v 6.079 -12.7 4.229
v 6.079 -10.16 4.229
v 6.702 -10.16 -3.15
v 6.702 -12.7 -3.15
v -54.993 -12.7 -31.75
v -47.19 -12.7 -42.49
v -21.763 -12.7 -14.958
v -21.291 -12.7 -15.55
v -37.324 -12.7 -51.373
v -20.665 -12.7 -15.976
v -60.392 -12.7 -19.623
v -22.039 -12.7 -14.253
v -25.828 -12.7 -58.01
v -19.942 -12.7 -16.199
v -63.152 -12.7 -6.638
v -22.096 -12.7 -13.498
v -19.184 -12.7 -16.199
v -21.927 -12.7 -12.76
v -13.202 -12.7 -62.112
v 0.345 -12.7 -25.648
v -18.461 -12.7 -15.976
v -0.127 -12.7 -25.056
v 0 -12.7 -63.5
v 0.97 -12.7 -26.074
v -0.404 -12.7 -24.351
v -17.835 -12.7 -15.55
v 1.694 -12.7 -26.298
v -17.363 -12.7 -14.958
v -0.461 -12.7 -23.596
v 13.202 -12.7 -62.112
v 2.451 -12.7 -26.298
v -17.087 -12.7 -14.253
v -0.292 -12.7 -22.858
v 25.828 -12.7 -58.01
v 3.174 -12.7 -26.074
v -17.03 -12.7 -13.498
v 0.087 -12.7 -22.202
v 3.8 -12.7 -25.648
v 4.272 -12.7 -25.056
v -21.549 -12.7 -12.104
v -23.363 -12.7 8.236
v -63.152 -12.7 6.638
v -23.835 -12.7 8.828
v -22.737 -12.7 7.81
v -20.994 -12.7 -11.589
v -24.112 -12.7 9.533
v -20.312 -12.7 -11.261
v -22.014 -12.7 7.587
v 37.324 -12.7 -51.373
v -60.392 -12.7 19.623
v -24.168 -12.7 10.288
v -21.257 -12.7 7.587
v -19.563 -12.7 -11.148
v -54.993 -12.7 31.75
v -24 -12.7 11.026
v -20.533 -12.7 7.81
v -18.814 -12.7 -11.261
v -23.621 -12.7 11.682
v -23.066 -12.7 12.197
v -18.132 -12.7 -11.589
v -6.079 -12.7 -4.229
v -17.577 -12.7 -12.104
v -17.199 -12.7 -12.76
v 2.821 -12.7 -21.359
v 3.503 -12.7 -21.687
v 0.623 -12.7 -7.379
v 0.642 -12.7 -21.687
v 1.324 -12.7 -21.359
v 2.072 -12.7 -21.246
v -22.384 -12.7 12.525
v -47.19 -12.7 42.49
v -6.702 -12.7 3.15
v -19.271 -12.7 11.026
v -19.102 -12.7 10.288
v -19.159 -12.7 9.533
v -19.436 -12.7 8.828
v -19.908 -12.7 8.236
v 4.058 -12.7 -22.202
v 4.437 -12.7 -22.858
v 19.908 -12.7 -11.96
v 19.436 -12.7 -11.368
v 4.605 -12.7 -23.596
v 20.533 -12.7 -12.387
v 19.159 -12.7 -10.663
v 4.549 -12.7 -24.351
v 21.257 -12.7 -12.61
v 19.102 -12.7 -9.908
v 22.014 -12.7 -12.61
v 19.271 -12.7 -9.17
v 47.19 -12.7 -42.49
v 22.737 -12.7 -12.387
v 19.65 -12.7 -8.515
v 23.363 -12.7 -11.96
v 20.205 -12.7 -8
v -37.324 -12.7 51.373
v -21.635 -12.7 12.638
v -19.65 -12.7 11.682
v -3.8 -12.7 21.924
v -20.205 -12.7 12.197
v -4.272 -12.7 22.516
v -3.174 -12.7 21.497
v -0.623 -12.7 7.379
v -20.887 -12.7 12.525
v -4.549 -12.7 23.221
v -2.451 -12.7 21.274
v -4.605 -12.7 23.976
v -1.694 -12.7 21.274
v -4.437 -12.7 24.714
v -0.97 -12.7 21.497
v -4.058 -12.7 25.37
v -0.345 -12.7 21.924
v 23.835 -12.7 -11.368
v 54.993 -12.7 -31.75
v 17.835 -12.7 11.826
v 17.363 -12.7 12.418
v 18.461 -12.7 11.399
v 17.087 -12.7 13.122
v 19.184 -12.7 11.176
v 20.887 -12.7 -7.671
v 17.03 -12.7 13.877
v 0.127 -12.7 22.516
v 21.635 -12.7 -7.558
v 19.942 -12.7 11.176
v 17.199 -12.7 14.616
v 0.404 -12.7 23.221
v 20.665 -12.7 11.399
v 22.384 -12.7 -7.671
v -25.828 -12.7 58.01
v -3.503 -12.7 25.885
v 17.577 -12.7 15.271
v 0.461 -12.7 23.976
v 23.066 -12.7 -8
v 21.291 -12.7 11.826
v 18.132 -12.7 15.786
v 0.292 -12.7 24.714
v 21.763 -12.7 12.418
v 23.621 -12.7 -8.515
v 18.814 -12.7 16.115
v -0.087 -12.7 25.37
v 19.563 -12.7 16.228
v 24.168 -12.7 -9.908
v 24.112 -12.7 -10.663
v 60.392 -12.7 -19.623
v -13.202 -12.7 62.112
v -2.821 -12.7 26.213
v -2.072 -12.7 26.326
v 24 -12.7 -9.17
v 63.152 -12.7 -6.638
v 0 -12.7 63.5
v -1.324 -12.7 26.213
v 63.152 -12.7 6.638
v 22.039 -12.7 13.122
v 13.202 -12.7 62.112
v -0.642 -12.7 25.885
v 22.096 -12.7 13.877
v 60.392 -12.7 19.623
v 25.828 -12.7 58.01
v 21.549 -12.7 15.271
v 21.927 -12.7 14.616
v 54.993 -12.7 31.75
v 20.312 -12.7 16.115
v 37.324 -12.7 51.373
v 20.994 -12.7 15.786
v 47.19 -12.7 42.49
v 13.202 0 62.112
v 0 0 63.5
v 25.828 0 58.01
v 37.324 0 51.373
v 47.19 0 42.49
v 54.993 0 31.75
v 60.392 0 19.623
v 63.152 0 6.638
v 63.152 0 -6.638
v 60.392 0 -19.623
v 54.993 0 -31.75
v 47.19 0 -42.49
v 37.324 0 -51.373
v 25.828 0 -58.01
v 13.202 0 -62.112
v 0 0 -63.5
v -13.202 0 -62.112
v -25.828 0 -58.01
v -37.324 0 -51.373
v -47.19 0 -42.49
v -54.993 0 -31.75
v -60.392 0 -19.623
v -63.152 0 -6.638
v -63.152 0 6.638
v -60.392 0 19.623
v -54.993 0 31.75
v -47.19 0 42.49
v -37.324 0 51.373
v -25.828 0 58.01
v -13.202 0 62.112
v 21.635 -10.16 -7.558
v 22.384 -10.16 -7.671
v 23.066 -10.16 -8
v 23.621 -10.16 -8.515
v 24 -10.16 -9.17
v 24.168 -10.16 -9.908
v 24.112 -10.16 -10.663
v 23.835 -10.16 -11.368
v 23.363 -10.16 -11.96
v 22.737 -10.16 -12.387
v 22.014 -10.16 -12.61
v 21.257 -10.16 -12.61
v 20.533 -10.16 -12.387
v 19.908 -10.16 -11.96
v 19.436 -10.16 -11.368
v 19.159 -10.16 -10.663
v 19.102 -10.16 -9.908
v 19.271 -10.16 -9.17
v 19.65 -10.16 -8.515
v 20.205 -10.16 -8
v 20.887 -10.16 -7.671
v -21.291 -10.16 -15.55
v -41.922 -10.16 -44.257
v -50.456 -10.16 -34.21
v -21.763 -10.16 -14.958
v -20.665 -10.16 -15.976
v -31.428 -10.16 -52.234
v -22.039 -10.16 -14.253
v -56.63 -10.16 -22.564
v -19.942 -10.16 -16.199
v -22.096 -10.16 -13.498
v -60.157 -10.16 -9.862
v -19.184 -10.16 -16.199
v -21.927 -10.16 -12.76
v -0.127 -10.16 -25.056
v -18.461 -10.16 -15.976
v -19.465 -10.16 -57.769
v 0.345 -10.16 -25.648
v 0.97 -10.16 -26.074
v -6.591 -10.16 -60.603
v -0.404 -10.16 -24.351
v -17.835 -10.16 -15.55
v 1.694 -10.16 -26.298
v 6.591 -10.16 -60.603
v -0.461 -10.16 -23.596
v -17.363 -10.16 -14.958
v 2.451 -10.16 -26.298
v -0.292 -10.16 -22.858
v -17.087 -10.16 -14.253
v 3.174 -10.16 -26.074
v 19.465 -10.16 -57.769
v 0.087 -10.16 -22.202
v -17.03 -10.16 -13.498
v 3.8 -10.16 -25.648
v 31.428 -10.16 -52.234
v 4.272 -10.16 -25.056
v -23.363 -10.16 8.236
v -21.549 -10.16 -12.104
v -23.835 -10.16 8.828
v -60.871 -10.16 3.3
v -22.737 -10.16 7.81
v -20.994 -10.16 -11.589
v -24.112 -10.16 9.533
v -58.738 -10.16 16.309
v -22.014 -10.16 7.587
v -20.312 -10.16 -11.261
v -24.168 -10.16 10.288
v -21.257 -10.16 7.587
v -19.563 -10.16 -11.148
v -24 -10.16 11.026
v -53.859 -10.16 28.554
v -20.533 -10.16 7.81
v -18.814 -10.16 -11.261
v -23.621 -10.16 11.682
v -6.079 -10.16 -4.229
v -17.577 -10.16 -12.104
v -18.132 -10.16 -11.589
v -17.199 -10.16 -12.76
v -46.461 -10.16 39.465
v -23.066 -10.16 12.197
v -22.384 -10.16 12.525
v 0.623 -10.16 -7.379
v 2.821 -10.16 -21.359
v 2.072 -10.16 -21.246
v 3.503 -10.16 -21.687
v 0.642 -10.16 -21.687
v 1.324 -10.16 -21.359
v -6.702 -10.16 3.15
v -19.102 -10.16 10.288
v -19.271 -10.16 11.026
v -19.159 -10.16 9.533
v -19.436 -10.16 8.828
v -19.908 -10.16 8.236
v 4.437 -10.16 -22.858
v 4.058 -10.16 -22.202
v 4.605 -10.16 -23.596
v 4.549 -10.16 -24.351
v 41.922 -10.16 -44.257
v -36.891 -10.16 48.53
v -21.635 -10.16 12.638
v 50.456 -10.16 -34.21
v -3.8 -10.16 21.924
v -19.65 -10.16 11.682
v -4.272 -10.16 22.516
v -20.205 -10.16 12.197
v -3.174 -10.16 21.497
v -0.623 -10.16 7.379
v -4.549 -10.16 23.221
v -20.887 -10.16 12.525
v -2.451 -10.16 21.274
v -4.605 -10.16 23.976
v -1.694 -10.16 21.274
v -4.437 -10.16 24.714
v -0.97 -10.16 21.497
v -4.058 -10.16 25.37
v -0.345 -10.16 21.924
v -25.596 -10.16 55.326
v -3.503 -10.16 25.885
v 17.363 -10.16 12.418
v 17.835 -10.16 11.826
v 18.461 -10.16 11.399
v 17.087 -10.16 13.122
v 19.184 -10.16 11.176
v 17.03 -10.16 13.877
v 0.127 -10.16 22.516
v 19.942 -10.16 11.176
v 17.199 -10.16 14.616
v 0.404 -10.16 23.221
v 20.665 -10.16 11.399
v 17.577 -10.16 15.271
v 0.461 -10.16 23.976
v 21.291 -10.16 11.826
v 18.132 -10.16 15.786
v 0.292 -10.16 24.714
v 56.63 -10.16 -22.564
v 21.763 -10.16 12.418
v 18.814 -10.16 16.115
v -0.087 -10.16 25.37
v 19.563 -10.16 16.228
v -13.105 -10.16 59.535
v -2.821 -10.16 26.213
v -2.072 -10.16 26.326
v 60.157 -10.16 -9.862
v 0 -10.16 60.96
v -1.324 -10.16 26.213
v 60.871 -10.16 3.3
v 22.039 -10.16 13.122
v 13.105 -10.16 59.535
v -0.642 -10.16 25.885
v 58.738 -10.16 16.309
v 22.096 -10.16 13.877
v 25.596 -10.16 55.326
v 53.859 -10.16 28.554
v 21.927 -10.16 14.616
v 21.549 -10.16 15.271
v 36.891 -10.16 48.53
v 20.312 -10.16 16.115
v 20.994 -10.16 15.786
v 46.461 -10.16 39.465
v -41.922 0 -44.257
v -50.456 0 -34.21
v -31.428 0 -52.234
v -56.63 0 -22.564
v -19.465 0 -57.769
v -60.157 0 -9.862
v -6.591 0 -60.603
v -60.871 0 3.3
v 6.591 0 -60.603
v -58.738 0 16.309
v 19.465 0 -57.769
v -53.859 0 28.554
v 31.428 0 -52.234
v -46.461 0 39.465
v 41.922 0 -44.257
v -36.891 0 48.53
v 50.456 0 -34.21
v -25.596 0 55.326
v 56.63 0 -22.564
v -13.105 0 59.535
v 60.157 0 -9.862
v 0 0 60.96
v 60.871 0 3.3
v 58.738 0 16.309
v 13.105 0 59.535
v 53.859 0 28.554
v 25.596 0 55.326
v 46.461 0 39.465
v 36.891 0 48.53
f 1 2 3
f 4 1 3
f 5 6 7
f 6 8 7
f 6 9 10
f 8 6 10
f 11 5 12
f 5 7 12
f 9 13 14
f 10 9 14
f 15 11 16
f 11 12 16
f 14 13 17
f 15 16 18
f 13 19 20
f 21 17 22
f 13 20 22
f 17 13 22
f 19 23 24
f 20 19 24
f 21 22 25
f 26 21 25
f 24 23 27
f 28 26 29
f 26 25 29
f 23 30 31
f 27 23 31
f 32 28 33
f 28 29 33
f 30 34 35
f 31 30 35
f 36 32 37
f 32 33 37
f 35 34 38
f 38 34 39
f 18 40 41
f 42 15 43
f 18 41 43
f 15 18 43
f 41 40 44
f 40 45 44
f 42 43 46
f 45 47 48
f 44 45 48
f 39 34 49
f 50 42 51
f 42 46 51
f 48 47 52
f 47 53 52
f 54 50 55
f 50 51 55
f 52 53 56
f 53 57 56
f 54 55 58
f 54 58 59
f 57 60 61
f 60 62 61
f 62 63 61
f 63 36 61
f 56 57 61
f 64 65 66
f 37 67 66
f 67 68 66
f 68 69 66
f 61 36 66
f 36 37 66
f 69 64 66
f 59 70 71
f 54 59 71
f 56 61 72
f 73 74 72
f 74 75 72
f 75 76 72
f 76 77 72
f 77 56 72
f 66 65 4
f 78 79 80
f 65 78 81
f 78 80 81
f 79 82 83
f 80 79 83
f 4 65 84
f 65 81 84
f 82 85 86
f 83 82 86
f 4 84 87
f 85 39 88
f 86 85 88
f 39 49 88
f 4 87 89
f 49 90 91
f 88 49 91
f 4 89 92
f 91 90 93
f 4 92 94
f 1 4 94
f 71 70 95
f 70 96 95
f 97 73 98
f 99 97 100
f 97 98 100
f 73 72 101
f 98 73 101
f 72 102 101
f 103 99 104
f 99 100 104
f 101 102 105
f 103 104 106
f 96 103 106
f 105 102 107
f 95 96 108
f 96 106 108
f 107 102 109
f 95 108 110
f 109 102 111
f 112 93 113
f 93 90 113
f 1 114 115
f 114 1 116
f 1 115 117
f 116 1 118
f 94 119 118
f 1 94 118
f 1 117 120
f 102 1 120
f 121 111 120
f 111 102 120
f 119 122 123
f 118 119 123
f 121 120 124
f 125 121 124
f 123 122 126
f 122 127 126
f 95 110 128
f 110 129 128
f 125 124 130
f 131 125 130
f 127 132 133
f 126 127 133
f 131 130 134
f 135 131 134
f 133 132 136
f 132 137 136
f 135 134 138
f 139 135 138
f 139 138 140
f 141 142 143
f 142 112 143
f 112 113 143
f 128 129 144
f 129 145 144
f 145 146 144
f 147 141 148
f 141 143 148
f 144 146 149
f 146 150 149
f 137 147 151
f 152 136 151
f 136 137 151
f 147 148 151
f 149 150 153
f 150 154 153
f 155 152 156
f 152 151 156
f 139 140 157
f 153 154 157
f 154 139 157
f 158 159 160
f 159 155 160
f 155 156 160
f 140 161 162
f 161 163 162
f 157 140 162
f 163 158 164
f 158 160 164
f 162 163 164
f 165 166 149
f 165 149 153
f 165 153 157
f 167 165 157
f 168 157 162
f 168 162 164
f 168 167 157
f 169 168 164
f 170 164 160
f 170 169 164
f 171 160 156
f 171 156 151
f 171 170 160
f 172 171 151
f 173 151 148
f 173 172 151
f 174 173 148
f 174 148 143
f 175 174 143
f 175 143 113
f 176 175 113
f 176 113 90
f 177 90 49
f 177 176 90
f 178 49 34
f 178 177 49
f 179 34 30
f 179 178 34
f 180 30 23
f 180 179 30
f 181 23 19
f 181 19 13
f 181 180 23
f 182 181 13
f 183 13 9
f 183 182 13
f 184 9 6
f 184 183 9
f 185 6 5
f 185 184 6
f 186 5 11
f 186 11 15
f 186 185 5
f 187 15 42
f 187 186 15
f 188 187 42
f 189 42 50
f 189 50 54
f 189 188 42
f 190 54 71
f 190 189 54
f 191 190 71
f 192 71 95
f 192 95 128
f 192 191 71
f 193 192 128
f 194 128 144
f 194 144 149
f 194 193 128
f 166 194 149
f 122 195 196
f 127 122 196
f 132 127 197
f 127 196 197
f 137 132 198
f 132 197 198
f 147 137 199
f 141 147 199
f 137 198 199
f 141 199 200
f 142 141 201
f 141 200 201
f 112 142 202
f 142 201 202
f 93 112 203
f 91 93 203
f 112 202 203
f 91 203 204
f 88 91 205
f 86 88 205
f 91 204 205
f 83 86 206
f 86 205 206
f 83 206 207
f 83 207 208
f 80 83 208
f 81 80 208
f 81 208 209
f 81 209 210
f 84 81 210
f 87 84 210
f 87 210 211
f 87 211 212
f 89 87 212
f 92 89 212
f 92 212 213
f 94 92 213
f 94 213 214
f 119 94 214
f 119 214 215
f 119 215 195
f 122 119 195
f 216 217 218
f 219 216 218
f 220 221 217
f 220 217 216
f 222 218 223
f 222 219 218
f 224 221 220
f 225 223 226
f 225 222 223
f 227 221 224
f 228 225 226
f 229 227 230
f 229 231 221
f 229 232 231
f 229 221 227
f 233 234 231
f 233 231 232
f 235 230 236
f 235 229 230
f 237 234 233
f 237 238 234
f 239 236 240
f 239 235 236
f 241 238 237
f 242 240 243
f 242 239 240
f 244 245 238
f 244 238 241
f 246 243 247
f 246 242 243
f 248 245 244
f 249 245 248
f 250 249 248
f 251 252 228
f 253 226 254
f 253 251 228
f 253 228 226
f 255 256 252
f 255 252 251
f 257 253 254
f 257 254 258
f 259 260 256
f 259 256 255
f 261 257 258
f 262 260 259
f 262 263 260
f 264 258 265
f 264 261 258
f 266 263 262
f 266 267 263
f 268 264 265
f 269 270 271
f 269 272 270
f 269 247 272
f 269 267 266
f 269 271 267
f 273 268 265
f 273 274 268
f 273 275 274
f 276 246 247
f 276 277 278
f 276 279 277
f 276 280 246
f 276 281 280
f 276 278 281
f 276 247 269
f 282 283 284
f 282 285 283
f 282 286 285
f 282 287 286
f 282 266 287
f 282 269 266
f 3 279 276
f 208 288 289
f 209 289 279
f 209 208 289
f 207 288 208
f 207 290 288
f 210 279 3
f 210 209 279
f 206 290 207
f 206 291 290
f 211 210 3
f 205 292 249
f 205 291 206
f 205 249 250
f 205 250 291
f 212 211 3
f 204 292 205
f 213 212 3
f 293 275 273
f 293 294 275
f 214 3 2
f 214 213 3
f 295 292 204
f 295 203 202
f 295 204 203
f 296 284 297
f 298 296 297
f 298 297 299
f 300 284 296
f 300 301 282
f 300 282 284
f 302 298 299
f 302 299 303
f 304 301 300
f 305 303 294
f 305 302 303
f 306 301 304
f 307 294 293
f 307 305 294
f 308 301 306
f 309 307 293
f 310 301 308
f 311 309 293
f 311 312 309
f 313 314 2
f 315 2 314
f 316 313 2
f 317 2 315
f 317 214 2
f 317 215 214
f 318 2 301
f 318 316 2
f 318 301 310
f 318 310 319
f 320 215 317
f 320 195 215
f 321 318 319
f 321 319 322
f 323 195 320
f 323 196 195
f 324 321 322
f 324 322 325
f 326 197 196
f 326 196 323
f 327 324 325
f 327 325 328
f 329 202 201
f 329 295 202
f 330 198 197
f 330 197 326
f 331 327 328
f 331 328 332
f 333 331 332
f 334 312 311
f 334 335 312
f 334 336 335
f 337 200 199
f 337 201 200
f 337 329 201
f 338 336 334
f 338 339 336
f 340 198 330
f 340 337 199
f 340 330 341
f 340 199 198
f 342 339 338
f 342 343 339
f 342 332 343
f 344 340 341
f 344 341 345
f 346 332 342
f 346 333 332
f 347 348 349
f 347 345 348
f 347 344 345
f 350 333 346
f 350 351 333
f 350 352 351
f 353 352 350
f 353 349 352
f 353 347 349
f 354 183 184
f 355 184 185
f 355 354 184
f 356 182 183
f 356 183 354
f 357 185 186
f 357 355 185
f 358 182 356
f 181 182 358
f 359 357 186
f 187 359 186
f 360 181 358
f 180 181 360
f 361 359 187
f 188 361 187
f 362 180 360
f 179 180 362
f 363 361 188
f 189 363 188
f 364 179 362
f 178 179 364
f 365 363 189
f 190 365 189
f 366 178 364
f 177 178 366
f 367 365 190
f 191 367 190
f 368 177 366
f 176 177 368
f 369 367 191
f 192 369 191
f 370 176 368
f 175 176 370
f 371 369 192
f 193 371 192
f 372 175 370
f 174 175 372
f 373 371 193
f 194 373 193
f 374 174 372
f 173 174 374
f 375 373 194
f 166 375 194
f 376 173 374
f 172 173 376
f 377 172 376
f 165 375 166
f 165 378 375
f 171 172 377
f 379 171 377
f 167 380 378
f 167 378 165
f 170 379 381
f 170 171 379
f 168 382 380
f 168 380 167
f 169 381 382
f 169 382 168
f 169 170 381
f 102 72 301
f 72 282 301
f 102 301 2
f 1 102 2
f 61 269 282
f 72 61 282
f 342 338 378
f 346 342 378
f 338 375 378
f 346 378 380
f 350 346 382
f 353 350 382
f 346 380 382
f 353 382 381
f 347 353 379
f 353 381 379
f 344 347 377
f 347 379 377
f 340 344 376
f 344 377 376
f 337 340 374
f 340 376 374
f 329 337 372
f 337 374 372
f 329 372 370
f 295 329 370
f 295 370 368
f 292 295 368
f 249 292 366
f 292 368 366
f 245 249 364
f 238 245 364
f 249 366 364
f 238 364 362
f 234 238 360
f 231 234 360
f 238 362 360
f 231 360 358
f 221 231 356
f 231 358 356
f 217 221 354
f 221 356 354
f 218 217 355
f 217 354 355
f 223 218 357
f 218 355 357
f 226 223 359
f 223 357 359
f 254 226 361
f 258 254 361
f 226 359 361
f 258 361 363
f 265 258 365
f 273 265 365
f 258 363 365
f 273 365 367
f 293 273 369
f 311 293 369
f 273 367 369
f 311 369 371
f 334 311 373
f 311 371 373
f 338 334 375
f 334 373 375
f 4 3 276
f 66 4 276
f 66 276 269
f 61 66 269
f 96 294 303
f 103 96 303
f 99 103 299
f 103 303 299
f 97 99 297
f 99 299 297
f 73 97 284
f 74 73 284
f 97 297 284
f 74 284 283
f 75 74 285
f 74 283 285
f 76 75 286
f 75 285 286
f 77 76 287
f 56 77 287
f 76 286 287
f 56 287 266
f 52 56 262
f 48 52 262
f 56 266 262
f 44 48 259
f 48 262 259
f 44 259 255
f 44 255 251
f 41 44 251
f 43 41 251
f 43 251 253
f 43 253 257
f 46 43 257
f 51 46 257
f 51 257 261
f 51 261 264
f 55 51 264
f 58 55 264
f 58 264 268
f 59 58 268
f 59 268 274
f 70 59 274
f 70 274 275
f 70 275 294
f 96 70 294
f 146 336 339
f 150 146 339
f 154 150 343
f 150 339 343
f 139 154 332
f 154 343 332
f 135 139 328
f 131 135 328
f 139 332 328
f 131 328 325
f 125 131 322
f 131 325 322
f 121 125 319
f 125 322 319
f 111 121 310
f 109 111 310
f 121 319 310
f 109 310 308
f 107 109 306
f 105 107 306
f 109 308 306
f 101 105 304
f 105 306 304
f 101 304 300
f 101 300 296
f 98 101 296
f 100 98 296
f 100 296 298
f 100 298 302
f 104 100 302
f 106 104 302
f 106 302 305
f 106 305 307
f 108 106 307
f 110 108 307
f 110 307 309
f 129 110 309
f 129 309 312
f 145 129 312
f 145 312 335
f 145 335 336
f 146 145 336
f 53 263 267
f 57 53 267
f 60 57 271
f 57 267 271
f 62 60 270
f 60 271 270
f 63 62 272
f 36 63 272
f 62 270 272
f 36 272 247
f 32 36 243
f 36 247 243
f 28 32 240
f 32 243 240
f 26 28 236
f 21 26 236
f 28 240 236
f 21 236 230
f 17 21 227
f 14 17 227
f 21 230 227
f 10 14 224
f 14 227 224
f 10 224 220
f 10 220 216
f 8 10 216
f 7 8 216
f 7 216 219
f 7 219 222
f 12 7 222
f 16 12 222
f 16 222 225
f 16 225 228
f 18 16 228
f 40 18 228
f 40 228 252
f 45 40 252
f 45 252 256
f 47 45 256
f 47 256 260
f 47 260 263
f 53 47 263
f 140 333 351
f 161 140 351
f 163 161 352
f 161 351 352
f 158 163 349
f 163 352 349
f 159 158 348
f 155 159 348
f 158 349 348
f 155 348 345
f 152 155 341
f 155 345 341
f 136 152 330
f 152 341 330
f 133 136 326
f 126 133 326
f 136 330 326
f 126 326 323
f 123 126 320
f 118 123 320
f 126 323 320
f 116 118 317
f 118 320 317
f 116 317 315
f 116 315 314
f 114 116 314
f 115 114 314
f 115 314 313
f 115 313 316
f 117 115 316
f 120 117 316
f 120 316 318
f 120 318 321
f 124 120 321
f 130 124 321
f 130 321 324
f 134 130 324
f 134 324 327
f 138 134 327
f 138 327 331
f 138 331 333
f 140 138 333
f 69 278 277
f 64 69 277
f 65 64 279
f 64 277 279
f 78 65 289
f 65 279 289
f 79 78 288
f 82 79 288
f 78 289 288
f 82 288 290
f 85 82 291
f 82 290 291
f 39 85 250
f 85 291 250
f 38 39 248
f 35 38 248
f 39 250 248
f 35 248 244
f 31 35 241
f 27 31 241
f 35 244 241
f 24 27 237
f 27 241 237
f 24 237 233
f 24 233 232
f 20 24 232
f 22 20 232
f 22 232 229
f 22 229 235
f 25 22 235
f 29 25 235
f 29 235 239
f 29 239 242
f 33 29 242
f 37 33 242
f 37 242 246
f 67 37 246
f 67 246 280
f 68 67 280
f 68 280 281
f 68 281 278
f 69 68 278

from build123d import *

# Parameters (mm, degrees)
SKETCH1_R           = 63.5
BOSS_EXTRUDE1_DEPTH = 12.7
SKETCH7_R           = 2.54
CUT_EXTRUDE2_DEPTH  = 91.696141042
CUT_EXTRUDE3_DEPTH  = 91.696141042
SHELL1_T            = -2.54


with BuildPart() as part:
    # Sketch1 → Boss-Extrude1 (new body)
    with BuildSketch(Plane(origin=(0, 0, 0), x_dir=(1, 0, 0), z_dir=(0, 1, 0))):
        with Locations(Location((0, 0, 0), (0, 0, 270))):
            Circle(SKETCH1_R)
    extrude(amount=-BOSS_EXTRUDE1_DEPTH)

    # Sketch7 → Cut-Extrude2 (cut, through all)
    with BuildSketch(Plane(origin=(0, 0, 0), x_dir=(1, 0, 0), z_dir=(0, 1, 0))):
        with Locations(Location((19.563011922, -13.687656502, 0), (0, 0, 270))):
            Circle(SKETCH7_R)
        with Locations(Location((21.635364211, 10.098237048, 0), (0, 0, 270))):
            Circle(SKETCH7_R)
        with Locations(Location((2.072352288, 23.78589355, 0), (0, 0, 270))):
            Circle(SKETCH7_R)
        with Locations(Location((-19.563011922, 13.687656502, 0), (0, 0, 270))):
            Circle(SKETCH7_R)
        with Locations(Location((-21.635364211, -10.098237048, 0), (0, 0, 270))):
            Circle(SKETCH7_R)
        with Locations(Location((-2.072352288, -23.78589355, 0), (0, 0, 270))):
            Circle(SKETCH7_R)
    extrude(amount=-CUT_EXTRUDE2_DEPTH, mode=Mode.SUBTRACT)

    # Sketch8 → Cut-Extrude3 (cut, through all)
    with BuildSketch(Plane(origin=(0, 0, 0), x_dir=(1, 0, 0), z_dir=(0, 1, 0))):
        Polygon((-6.702144956, -3.150433197), (-0.622717296, -7.37944439), (6.079427659, -4.229011193), (6.702144956, 3.150433197), (0.622717296, 7.37944439), (-6.079427659, 4.229011193), align=None)
    extrude(amount=-CUT_EXTRUDE3_DEPTH, mode=Mode.SUBTRACT)

    # Shell1
    shell1_openings = [part.faces().sort_by_distance(p)[0] for p in [
        (-2.072352288, -6.35, 21.24589355),
        (19.563011922, -6.35, 11.147656502),
        (0, 0, -61.703948776),
        (-21.635364211, -6.35, 7.558237048),
        (-19.563011922, -6.35, -16.227656502),
        (2.072352288, -6.35, -26.32589355),
        (21.635364211, -6.35, -12.638237048),
        (-6.390786307, -6.35, -0.539288998),
        (-2.728355181, -6.35, -5.804227791),
        (3.662431126, -6.35, -5.264938793),
        (6.390786307, -6.35, 0.539288998),
        (2.728355181, -6.35, 5.804227791),
        (-3.662431126, -6.35, 5.264938793),
    ]]
    offset(amount=SHELL1_T, openings=shell1_openings, kind=Kind.INTERSECTION)


solid = part.part
